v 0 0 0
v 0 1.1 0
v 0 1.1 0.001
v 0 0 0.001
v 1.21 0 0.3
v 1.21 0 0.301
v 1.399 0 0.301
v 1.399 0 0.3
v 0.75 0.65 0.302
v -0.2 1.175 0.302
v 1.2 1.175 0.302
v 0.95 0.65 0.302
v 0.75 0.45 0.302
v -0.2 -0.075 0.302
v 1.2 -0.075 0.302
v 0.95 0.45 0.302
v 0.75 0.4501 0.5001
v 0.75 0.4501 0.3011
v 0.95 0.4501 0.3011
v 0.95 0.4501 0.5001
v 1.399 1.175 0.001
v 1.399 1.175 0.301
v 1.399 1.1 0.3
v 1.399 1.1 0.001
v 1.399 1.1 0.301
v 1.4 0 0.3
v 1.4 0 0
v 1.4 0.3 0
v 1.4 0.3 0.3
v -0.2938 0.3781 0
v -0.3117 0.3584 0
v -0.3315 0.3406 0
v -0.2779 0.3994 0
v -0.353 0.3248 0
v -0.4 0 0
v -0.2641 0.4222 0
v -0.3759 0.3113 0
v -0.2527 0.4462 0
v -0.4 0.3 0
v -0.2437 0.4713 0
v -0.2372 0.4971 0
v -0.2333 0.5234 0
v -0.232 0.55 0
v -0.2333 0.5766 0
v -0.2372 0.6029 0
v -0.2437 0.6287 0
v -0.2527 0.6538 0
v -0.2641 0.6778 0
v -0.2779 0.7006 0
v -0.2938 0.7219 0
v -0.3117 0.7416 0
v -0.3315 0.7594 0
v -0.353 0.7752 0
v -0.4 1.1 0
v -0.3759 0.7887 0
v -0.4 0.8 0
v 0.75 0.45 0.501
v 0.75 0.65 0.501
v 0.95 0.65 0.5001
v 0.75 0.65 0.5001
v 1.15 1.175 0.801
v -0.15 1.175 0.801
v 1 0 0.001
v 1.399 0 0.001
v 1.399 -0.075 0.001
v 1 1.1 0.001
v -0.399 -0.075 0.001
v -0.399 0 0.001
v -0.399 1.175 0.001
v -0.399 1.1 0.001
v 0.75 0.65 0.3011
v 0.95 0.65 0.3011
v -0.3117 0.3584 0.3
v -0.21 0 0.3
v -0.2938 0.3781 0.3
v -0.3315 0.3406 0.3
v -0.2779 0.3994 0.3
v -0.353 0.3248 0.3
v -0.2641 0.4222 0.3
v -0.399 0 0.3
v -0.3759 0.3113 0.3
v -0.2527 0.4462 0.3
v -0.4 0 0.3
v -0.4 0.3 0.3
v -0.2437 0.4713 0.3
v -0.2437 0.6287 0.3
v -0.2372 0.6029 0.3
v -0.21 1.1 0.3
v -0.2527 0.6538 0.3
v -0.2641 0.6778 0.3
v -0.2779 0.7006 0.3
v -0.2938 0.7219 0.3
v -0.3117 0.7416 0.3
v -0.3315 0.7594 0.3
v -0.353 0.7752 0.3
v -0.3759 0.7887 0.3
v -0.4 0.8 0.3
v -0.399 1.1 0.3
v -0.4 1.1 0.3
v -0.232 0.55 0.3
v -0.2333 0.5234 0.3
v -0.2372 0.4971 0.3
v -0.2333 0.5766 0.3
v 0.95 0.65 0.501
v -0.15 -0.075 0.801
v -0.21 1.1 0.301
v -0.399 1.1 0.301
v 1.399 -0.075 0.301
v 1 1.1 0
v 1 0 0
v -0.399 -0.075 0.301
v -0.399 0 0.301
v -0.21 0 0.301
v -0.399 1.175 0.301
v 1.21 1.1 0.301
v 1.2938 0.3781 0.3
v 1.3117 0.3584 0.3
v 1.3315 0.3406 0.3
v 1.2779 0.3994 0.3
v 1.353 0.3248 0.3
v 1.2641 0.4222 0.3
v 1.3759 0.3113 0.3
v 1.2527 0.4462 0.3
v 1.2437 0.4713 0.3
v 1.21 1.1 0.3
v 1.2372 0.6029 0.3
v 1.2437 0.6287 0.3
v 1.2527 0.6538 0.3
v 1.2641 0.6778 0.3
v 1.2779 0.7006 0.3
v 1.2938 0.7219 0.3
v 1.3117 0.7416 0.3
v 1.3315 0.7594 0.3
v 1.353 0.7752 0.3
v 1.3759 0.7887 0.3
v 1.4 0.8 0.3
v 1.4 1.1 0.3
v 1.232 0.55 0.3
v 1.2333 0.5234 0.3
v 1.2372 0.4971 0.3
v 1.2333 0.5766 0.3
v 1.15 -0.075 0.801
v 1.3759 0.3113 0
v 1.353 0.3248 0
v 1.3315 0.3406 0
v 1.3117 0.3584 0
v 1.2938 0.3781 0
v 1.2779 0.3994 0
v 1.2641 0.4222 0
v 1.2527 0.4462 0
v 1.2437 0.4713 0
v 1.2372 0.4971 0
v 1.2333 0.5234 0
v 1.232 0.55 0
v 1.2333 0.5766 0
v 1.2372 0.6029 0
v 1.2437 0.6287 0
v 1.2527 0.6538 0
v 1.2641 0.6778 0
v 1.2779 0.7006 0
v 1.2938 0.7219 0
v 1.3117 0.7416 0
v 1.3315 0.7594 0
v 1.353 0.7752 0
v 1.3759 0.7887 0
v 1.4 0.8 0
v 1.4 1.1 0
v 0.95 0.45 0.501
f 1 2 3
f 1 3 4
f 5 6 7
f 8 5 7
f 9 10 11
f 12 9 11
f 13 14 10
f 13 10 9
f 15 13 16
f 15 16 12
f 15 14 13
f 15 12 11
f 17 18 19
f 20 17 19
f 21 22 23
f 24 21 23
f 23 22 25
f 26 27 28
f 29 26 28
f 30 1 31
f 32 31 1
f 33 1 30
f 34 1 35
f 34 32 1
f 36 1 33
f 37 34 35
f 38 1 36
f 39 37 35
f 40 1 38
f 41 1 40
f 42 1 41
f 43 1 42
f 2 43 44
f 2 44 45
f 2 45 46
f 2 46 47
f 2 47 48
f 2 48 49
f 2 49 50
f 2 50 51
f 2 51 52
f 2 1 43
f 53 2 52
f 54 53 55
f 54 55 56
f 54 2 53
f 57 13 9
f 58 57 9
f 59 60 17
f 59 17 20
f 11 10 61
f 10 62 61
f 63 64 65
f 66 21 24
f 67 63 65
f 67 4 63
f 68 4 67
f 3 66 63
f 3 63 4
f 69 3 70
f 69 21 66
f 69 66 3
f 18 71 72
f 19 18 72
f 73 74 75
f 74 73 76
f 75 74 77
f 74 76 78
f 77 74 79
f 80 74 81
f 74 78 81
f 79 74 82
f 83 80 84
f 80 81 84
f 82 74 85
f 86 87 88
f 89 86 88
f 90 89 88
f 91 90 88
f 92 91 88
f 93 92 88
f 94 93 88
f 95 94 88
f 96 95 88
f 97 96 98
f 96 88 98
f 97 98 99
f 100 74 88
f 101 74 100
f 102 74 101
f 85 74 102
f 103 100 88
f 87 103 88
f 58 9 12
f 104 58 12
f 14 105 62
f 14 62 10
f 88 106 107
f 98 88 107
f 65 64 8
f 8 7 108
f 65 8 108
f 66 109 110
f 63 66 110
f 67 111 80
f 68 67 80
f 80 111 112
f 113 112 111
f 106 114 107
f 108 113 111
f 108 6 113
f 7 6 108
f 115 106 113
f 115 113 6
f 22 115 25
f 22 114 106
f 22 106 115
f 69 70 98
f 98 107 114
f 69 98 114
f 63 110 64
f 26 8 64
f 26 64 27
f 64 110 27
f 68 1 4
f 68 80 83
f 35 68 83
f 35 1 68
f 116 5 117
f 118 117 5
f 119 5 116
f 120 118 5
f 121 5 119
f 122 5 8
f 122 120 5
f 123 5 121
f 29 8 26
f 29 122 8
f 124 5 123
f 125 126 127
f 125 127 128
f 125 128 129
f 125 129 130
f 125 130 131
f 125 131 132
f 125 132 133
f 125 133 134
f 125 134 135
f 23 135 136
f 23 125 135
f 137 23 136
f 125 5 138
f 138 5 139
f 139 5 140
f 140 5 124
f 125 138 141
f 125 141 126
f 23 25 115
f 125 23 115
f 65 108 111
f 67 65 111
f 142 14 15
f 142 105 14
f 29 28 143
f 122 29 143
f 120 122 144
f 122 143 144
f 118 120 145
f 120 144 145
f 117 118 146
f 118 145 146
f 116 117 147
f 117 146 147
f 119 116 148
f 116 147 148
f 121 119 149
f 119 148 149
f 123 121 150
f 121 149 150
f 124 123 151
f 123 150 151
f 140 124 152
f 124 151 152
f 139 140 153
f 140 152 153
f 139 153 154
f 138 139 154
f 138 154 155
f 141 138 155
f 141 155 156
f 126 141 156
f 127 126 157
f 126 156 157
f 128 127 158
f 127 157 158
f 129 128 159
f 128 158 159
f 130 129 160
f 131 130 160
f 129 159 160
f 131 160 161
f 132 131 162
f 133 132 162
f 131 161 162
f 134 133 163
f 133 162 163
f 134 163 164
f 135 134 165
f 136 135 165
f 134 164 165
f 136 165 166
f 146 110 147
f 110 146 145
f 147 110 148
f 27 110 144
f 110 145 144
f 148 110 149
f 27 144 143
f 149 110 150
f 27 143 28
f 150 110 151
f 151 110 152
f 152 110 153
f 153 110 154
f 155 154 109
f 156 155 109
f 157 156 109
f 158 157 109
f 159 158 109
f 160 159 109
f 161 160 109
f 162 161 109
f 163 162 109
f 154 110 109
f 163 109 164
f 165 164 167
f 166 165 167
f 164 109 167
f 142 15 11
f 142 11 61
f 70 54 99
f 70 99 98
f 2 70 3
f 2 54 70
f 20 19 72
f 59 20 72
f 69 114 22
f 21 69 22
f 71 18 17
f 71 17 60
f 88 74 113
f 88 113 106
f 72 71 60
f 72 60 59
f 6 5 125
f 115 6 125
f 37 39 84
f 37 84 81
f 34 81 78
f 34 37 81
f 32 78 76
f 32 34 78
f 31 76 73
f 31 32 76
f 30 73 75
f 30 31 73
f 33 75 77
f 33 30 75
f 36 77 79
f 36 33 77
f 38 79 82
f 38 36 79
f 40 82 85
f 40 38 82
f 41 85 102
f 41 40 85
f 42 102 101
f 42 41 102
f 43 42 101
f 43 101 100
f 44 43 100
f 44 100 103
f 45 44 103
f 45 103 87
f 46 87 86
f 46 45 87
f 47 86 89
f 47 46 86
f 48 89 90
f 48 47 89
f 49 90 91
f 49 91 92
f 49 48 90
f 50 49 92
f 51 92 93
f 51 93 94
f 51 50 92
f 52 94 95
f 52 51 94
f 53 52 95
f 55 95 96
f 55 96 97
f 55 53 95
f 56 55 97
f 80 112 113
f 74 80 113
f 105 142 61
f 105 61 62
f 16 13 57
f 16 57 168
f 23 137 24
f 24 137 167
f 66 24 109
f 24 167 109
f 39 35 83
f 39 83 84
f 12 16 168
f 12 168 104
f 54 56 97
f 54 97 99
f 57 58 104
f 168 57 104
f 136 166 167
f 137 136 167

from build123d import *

# Parameters (mm, degrees)
EXTRUDE1_DEPTH   = 0.3
EXTRUDE1_2_DEPTH = 0.3
EXTRUDE2_START   = 0.001
EXTRUDE2_DEPTH   = 0.3
EXTRUDE3_DEPTH   = 1.25
SKETCH4_W        = 0.2
SKETCH4_H        = 0.2
EXTRUDE4_DEPTH   = 0.2
EXTRUDE5_START   = 0.0001
SKETCH5_W        = 0.1999
SKETCH5_H        = 0.1999
EXTRUDE5_DEPTH   = 0.199
SKETCH6_W        = 0.21
SKETCH6_H        = 1.1
EXTRUDE6_DEPTH   = 0.001


with BuildPart() as part:
    # Sketch1 → Extrude1 (new body)
    with BuildSketch(Plane.XY):
        with BuildLine():
            Line((0, 0), (-0.4, 0))
            Line((-0.4, 0), (-0.4, 0.3))
            ThreePointArc((-0.4, 0.3), (-0.23198039, 0.55), (-0.4, 0.8))
            Line((-0.4, 0.8), (-0.4, 1.1))
            Line((-0.4, 1.1), (0, 1.1))
            Line((0, 1.1), (0, 0))
        make_face()
    extrude(amount=EXTRUDE1_DEPTH)



with BuildPart() as body_2:
    # Sketch1 → Extrude1 2 (new body)
    with BuildSketch(Plane.XY):
        with BuildLine():
            Line((1, 0), (1.4, 0))
            Line((1.4, 0), (1.4, 0.3))
            ThreePointArc((1.4, 0.3), (1.23198039, 0.55), (1.4, 0.8))
            Line((1.4, 0.8), (1.4, 1.1))
            Line((1.4, 1.1), (1, 1.1))
            Line((1, 1.1), (1, 0))
        make_face()
    extrude(amount=EXTRUDE1_2_DEPTH)


with BuildPart() as body_3:
    # Sketch2 → Extrude2 (new body)
    with BuildSketch(Plane.XY.offset(0.3).offset(EXTRUDE2_START)):
        Polygon((-0.399, 1.1), (-0.399, 1.175), (1.399, 1.175), (1.399, 1.1), (1, 1.1), (1, 0), (1.399, 0), (1.399, -0.075), (-0.399, -0.075), (-0.399, 0), (0, 0), (0, 1.1), align=None)
    extrude(amount=-EXTRUDE2_DEPTH)


with BuildPart() as body_4:
    # Sketch3 → Extrude3 (new body)
    with BuildSketch(Plane.XZ.offset(0.075)):
        Polygon((-0.2, 0.302), (1.2, 0.302), (1.15, 0.801), (-0.15, 0.801), align=None)
    extrude(amount=-EXTRUDE3_DEPTH)

    # Sketch4 → Extrude4 (cut)
    with BuildSketch(Plane.XY.offset(0.301)):
        with Locations((0.85, 0.55)):
            Rectangle(SKETCH4_W, SKETCH4_H)
    extrude(amount=EXTRUDE4_DEPTH, mode=Mode.SUBTRACT)


with BuildPart() as body_5:
    # Sketch5 → Extrude5 (new body)
    with BuildSketch(Plane.XY.offset(0.301).offset(EXTRUDE5_START)):
        with Locations((0.85, 0.55)):
            Rectangle(SKETCH5_W, SKETCH5_H)
    extrude(amount=EXTRUDE5_DEPTH)


with BuildPart() as part_1:
    add(part.part)

    add(body_2.part)  # Extrude6 merges body 2

    add(body_3.part)  # Extrude6 merges body 3
    # Sketch6 → Extrude6 (add)
    with BuildSketch(Plane.XY.offset(0.3)):
        with Locations((1.105, 0.55)):
            Rectangle(SKETCH6_W, SKETCH6_H)
        with Locations((-0.105, 0.55)):
            Rectangle(SKETCH6_W, SKETCH6_H)
    extrude(amount=EXTRUDE6_DEPTH)


solid = Compound([body_4.part, body_5.part, part_1.part])
